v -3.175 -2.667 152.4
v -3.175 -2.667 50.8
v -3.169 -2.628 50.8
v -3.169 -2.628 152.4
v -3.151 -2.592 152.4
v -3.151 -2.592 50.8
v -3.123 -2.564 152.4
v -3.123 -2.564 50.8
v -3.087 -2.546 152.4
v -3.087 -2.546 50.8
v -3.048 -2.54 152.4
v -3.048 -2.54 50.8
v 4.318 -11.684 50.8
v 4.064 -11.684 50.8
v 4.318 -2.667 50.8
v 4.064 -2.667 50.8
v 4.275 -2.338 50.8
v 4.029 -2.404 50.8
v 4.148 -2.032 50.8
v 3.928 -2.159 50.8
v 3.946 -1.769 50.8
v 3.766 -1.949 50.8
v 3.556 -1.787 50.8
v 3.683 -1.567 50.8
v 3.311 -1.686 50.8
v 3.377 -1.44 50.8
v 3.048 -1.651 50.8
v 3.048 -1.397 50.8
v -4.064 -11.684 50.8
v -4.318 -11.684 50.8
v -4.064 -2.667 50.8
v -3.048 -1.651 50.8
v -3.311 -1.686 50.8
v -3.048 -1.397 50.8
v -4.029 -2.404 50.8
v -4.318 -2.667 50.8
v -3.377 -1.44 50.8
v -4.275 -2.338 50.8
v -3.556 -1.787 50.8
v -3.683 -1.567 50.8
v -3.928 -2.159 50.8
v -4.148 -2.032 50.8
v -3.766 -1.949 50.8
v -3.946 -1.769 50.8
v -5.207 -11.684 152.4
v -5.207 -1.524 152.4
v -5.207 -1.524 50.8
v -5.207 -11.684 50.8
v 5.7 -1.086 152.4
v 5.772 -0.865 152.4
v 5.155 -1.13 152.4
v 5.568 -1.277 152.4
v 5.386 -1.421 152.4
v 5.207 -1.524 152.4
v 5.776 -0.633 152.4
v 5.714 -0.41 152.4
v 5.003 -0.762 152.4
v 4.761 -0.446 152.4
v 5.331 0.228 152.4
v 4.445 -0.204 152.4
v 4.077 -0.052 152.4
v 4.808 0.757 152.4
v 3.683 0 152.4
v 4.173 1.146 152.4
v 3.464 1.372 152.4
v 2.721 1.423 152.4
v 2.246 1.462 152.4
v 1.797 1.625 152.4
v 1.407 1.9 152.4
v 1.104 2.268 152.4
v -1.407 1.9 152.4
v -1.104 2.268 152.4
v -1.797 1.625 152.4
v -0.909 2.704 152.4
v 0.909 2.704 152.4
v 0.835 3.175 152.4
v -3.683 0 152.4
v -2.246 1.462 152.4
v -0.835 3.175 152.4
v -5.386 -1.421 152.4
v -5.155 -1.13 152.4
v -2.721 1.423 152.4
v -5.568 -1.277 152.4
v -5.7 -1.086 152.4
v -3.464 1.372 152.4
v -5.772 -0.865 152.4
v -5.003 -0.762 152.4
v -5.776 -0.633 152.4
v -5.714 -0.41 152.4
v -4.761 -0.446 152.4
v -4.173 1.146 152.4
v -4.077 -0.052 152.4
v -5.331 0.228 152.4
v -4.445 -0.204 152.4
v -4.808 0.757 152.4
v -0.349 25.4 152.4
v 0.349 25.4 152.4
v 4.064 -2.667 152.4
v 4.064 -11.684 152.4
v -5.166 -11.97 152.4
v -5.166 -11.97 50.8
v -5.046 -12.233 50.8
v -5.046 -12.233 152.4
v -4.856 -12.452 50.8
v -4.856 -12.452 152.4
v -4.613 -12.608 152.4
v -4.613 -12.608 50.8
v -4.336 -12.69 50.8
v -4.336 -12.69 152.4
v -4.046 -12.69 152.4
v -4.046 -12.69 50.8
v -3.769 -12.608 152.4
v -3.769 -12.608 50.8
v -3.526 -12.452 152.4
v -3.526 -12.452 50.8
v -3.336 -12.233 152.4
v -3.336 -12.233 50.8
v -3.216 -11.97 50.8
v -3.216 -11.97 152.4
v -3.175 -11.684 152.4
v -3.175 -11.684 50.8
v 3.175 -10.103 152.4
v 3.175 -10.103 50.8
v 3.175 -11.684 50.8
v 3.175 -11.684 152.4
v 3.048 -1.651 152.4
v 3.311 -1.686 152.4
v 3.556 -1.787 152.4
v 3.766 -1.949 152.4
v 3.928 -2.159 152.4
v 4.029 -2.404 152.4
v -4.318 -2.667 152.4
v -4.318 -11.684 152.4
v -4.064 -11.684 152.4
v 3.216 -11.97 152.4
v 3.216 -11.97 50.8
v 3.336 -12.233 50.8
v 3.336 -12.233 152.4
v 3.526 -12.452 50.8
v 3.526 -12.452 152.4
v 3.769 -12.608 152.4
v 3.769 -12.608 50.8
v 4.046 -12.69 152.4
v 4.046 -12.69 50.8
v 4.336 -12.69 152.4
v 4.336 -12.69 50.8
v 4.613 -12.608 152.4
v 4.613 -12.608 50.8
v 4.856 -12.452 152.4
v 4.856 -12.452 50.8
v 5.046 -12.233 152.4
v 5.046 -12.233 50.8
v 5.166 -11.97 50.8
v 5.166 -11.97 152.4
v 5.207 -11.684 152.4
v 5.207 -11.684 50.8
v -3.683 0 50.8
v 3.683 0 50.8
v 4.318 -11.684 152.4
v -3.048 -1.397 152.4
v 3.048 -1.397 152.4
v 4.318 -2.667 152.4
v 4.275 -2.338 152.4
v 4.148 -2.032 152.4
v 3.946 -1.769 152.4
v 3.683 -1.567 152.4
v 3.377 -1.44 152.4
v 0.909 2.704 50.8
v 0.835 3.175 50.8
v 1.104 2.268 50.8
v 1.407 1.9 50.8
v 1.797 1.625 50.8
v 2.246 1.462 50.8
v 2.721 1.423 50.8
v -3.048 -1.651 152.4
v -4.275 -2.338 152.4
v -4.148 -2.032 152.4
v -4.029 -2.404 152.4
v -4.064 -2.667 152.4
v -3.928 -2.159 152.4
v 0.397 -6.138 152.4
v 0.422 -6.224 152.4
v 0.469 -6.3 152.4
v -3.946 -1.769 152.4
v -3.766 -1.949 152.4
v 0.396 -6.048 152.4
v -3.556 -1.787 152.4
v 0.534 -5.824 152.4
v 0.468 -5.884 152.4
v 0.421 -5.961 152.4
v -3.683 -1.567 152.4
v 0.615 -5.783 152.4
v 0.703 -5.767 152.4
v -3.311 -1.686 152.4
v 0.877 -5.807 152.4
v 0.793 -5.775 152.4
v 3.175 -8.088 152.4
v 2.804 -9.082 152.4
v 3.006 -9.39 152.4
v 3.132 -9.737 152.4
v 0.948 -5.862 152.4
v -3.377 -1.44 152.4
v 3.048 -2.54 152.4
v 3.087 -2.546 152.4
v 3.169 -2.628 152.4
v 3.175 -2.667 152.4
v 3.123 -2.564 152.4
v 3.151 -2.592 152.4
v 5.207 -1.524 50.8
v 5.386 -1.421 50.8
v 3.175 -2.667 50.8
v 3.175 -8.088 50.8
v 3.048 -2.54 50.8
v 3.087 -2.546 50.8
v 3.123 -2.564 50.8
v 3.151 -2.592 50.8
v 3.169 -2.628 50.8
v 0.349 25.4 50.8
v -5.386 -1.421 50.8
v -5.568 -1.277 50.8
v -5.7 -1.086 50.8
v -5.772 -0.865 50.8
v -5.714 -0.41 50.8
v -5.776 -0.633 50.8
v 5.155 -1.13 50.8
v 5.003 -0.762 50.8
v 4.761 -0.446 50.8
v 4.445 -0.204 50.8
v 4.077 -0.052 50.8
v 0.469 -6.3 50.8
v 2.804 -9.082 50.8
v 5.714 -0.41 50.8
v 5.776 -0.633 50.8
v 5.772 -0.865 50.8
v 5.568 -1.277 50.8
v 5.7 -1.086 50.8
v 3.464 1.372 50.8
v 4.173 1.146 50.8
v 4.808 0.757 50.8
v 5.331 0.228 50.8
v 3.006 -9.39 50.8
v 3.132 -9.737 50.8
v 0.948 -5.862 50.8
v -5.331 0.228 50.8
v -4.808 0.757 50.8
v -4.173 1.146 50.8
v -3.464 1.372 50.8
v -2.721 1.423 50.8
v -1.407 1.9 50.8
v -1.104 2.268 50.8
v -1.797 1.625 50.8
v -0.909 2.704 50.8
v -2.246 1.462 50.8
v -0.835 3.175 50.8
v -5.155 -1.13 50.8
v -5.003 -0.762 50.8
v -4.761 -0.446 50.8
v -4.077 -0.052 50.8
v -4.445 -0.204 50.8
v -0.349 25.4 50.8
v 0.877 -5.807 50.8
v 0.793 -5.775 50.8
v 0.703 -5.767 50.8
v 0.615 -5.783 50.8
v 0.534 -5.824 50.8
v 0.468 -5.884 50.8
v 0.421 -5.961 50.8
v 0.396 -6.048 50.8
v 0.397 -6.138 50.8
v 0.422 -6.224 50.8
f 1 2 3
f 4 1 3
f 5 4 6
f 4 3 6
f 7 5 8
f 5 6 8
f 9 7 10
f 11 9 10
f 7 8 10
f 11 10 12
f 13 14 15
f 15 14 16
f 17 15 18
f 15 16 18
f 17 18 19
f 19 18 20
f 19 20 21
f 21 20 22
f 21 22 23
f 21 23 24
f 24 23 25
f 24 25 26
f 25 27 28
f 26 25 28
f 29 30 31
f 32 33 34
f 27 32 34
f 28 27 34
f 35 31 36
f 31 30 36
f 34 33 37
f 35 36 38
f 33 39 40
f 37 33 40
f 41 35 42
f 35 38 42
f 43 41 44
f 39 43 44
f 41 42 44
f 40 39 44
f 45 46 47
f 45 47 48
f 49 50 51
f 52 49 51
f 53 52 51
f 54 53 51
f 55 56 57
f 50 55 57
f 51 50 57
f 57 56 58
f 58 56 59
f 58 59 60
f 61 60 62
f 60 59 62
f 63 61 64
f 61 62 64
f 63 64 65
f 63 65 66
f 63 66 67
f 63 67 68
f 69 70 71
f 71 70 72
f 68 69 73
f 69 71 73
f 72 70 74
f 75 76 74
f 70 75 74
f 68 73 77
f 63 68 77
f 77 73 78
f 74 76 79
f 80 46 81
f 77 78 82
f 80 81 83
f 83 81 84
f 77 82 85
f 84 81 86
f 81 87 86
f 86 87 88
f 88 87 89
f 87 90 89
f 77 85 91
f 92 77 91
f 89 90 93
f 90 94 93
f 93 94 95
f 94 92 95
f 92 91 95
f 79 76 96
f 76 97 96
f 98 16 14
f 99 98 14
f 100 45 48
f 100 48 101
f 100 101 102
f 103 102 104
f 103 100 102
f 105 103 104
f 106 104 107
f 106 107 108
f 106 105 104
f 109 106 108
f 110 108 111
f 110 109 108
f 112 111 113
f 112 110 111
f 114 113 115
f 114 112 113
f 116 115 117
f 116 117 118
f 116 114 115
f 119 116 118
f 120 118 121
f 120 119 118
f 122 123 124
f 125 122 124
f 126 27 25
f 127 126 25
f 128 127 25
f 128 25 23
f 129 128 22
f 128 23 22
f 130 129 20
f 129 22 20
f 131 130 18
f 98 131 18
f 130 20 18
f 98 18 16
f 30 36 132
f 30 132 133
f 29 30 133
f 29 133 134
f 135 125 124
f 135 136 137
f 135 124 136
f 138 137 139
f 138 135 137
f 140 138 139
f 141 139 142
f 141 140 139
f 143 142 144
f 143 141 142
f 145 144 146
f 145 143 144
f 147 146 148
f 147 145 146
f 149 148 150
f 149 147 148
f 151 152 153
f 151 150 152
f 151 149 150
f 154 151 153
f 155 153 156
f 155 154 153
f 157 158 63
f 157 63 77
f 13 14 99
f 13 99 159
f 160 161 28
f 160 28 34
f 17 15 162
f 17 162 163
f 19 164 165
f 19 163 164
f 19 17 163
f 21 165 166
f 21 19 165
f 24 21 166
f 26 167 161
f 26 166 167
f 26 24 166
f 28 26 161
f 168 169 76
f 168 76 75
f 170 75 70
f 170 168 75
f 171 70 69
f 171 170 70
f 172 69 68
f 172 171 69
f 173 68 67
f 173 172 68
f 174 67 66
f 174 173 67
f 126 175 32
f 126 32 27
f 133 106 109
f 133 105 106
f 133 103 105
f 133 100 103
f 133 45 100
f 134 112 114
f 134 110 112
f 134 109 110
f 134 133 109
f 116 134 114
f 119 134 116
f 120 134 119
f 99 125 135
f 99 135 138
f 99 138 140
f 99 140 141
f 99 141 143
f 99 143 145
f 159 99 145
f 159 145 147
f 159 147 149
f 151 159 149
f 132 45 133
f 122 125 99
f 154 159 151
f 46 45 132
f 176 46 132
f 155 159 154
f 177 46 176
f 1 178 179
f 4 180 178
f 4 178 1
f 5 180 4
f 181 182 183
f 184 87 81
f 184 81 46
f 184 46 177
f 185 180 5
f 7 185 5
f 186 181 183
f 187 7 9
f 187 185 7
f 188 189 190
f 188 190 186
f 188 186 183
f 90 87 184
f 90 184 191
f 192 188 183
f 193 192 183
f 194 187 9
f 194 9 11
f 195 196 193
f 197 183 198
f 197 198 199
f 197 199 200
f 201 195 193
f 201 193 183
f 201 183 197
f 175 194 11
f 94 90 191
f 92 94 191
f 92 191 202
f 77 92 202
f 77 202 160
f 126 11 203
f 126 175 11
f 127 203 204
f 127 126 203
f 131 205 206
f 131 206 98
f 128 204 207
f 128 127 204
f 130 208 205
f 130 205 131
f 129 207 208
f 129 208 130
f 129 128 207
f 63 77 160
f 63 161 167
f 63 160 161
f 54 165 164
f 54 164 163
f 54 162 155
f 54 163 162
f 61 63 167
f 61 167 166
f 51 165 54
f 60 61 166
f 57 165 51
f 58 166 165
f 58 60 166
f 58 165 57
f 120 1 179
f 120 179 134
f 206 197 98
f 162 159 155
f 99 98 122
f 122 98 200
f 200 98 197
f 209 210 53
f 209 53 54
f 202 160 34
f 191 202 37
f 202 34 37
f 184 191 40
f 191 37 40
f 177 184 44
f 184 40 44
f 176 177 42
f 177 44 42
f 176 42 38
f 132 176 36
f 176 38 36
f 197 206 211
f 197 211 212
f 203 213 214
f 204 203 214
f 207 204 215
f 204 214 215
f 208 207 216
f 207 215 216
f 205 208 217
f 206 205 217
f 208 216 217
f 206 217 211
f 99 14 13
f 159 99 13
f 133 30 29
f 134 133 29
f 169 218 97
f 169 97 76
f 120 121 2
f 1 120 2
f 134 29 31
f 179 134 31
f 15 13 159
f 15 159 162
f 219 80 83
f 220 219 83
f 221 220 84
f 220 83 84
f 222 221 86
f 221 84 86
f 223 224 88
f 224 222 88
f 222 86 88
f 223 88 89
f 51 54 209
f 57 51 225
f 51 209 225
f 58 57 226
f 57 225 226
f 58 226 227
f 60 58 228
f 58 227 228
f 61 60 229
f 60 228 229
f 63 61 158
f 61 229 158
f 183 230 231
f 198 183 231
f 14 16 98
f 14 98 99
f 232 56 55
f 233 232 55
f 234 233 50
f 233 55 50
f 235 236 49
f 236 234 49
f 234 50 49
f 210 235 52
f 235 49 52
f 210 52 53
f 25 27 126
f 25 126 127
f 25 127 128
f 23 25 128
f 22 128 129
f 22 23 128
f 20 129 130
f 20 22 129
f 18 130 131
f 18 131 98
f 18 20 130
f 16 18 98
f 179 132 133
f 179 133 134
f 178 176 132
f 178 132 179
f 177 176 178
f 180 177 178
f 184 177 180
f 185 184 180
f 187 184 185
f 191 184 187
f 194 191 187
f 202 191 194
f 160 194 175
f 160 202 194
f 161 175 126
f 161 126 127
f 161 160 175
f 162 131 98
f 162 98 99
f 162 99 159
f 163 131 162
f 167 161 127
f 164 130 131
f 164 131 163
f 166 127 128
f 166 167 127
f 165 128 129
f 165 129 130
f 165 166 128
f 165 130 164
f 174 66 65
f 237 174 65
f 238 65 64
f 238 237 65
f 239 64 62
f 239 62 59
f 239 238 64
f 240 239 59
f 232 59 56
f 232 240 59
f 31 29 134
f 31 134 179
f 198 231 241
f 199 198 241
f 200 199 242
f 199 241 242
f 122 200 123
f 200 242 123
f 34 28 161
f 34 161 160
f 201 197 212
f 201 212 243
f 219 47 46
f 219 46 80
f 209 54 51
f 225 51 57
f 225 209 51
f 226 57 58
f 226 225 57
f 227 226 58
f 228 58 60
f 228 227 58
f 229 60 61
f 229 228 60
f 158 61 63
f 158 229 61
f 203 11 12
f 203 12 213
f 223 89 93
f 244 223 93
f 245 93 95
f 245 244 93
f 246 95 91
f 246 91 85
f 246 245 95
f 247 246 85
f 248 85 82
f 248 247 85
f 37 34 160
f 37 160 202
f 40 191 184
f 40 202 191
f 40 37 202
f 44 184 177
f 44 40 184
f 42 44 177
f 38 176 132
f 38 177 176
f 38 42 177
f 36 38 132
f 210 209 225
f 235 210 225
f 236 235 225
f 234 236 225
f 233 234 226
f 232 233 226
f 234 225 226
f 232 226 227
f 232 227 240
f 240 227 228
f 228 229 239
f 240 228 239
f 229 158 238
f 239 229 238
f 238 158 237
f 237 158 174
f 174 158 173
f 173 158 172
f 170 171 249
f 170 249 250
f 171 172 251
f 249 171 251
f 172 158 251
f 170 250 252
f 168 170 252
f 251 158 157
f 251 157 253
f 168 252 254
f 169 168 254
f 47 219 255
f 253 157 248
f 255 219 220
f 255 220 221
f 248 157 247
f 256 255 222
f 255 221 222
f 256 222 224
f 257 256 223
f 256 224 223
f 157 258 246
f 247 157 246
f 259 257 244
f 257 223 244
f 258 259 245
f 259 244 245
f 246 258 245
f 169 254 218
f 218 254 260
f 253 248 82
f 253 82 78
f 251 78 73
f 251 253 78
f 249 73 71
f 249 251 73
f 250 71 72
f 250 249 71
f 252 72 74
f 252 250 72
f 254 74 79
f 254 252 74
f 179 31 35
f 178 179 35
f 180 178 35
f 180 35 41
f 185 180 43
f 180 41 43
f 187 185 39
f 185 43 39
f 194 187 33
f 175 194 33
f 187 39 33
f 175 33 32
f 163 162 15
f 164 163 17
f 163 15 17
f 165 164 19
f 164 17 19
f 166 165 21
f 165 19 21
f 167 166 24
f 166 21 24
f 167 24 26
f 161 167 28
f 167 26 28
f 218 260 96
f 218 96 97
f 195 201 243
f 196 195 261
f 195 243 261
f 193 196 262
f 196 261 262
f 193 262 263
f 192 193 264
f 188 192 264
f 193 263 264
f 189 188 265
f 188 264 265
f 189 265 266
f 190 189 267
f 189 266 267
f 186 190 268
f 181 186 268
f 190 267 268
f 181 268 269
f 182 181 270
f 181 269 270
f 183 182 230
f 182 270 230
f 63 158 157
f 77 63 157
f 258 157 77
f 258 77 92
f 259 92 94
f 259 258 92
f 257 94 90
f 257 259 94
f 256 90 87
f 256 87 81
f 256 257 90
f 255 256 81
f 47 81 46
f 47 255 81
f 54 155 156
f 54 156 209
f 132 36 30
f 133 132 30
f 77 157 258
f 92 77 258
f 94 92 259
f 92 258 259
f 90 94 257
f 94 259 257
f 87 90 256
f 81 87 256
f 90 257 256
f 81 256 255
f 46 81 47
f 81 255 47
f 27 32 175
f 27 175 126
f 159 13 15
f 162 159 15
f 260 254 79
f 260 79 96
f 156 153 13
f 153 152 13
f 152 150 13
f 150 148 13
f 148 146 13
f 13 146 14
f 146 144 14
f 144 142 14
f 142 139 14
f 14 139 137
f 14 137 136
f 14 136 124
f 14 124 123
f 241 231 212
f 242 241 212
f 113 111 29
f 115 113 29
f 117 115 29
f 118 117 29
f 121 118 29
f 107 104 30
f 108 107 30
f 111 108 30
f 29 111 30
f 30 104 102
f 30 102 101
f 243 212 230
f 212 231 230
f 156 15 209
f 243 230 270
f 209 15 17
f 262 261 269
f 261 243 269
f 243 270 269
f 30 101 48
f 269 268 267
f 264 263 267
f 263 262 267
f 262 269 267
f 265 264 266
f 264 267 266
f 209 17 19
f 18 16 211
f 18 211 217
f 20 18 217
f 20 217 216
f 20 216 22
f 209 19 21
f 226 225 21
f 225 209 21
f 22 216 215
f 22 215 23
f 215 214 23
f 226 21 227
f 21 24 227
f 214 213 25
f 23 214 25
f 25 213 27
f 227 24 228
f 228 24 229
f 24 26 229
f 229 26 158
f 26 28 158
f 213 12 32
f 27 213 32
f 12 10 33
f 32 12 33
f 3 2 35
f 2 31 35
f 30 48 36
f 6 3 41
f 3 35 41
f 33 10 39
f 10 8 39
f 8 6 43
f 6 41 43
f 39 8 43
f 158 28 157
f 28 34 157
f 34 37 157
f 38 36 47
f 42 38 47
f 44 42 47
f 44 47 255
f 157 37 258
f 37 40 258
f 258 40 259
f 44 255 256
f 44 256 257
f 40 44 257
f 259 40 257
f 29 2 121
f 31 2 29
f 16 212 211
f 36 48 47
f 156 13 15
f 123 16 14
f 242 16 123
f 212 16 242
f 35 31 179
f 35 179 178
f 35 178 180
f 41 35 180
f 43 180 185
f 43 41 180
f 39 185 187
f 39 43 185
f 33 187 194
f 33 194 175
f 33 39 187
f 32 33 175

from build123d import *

# Parameters (mm, degrees)
BOSS_EXTRUDE1_DEPTH      = 152.4
BOSS_EXTRUDE1_DEPTH_BACK = 152.4
BOSS_EXTRUDE2_DEPTH      = 152.4
BOSS_EXTRUDE2_DEPTH_BACK = 152.4
FILLET1_R                = 0.79375
CUT_EXTRUDE1_DEPTH       = 155.610348225
CUT_EXTRUDE1_DEPTH_BACK  = 155.610348225
BOSS_EXTRUDE3_DEPTH      = 152.4
BOSS_EXTRUDE3_DEPTH_BACK = 152.4
FILLET2_RADIUS           = 1.016
FILLET2_LENGTH           = 304.8
FILLET3_RADIUS           = 1.016
FILLET3_LENGTH           = 304.8
CUT_EXTRUDE2_DEPTH       = 155.610348225
CUT_EXTRUDE2_DEPTH_BACK  = 155.610348225
SKETCH6_W                = 203.2
SKETCH6_H                = 38.1


with BuildPart() as part:
    # Sketch4 → Boss-Extrude1 (new, two sides: drawn at the far end of the back side and taken through both)
    with BuildSketch(Plane.XY.offset(-BOSS_EXTRUDE1_DEPTH_BACK)):
        with BuildLine():
            Line((-5.207, -12.7), (-3.175, -12.7))
            Line((-3.175, -12.7), (-3.175, -2.667))
            ThreePointArc((-3.175, -2.667), (-3.137802561, -2.577197439), (-3.048, -2.54))
            Line((-3.048, -2.54), (3.048, -2.54))
            ThreePointArc((3.048, -2.54), (3.137802561, -2.577197439), (3.175, -2.667))
            Line((3.175, -2.667), (3.175, -8.088159021))
            Line((3.175, -8.088159021), (0.948361947, -5.861520968))
            ThreePointArc((0.948361947, -5.861520968), (0.498727791, -5.851709916), (0.46931331, -6.300488167))
            Line((0.46931331, -6.300488167), (2.803595553, -9.082377417))
            ThreePointArc((2.803595553, -9.082377417), (3.079262035, -9.559845769), (3.175, -10.102802747))
            Line((3.175, -10.102802747), (3.175, -12.7))
            Line((3.175, -12.7), (5.207, -12.7))
            Line((5.207, -12.7), (5.207, -1.524))
            ThreePointArc((5.207, -1.524), (4.760630735, -0.446369265), (3.683, 0))
            Line((3.683, 0), (-3.683, 0))
            ThreePointArc((-3.683, 0), (-4.760630735, -0.446369265), (-5.207, -1.524))
            Line((-5.207, -1.524), (-5.207, -12.7))
        make_face()
    extrude(amount=BOSS_EXTRUDE1_DEPTH + BOSS_EXTRUDE1_DEPTH_BACK)

    # Sketch5 → Cut-Extrude1 (cut, two sides: drawn at the far end of the back side and taken through both)
    with BuildSketch(Plane.XY.offset(-CUT_EXTRUDE1_DEPTH_BACK)):
        with BuildLine():
            Line((4.318, -11.684), (4.318, -2.667))
            ThreePointArc((4.318, -2.667), (3.946025612, -1.768974388), (3.048, -1.397))
            Line((3.048, -1.397), (-3.048, -1.397))
            ThreePointArc((-3.048, -1.397), (-3.946025612, -1.768974388), (-4.318, -2.667))
            Line((-4.318, -2.667), (-4.318, -11.684))
            Line((-4.318, -11.684), (-4.064, -11.684))
            Line((-4.064, -11.684), (-4.064, -2.667))
            ThreePointArc((-4.064, -2.667), (-3.76642049, -1.94857951), (-3.048, -1.651))
            Line((-3.048, -1.651), (3.048, -1.651))
            ThreePointArc((3.048, -1.651), (3.76642049, -1.94857951), (4.064, -2.667))
            Line((4.064, -2.667), (4.064, -11.684))
            Line((4.064, -11.684), (4.318, -11.684))
        make_face()
    extrude(amount=CUT_EXTRUDE1_DEPTH + CUT_EXTRUDE1_DEPTH_BACK, mode=Mode.SUBTRACT)

    # Fillet2: full round fillet: the end face becomes a half cylinder, R = half its width
    fillet2_face = Plane((4.191, -12.7, 0), x_dir=(0, 0, 1), z_dir=(0, -1, 0))  # on the end face: x along it, z out of the body
    fillet2_slab = fillet2_face.offset(-FILLET2_RADIUS / 2) * Box(FILLET2_LENGTH, 2 * FILLET2_RADIUS, FILLET2_RADIUS, mode=Mode.PRIVATE)  # the body's end, R deep
    fillet2_round = Plane((4.191, -11.684, 0), x_dir=(0, -1, 0), z_dir=(0, 0, 1)) * Cylinder(FILLET2_RADIUS, FILLET2_LENGTH, mode=Mode.PRIVATE)  # its axis R under the face
    add(fillet2_slab - fillet2_round, mode=Mode.SUBTRACT)

    # Fillet3: full round fillet: the end face becomes a half cylinder, R = half its width
    fillet3_face = Plane((-4.191, -12.7, 0), x_dir=(0, 0, 1), z_dir=(0, -1, 0))  # on the end face: x along it, z out of the body
    fillet3_slab = fillet3_face.offset(-FILLET3_RADIUS / 2) * Box(FILLET3_LENGTH, 2 * FILLET3_RADIUS, FILLET3_RADIUS, mode=Mode.PRIVATE)  # the body's end, R deep
    fillet3_round = Plane((-4.191, -11.684, 0), x_dir=(0, -1, 0), z_dir=(0, 0, 1)) * Cylinder(FILLET3_RADIUS, FILLET3_LENGTH, mode=Mode.PRIVATE)  # its axis R under the face
    add(fillet3_slab - fillet3_round, mode=Mode.SUBTRACT)


with BuildPart() as body_2:
    # Sketch3 → Boss-Extrude2 (new, two sides: drawn at the far end of the back side and taken through both)
    with BuildSketch(Plane.XY.offset(-BOSS_EXTRUDE2_DEPTH_BACK)):
        with BuildLine():
            Line((3.683, 0), (-3.683, 0))
            ThreePointArc((-3.683, 0), (-4.760630735, -0.446369265), (-5.207, -1.524))
            Line((-5.207, -1.524), (-5.930511184, -1.106280623))
            ThreePointArc((-5.930511184, -1.106280623), (-4.801606302, 0.762), (-2.721270401, 1.423136341))
            ThreePointArc((-2.721270401, 1.423136341), (-1.407478061, 1.900010596), (-0.834886247, 3.175))
            Line((-0.834886247, 3.175), (-0.34925, 25.4))
            Line((-0.34925, 25.4), (0.34925, 25.4))
            Line((0.34925, 25.4), (0.834886247, 3.175))
            ThreePointArc((0.834886247, 3.175), (1.407478061, 1.900010596), (2.721270401, 1.423136341))
            ThreePointArc((2.721270401, 1.423136341), (4.801606302, 0.762), (5.930511184, -1.106280623))
            Line((5.930511184, -1.106280623), (5.207, -1.524))
            ThreePointArc((5.207, -1.524), (4.760630735, -0.446369265), (3.683, 0))
        make_face()
    extrude(amount=BOSS_EXTRUDE2_DEPTH + BOSS_EXTRUDE2_DEPTH_BACK)

    # Fillet1
    fillet1_edges = [body_2.edges().sort_by_distance(p)[0] for p in [
        (5.930511184, -1.106280623, 0),
        (-5.930511184, -1.106280623, 0),
    ]]
    fillet(fillet1_edges, radius=FILLET1_R)


with BuildPart() as body_3:
    # Sketch5<2> → Boss-Extrude3 (new, two sides: drawn at the far end of the back side and taken through both)
    with BuildSketch(Plane.XY.offset(-BOSS_EXTRUDE3_DEPTH_BACK)):
        with BuildLine():
            Line((4.318, -11.684), (4.318, -2.667))
            ThreePointArc((4.318, -2.667), (3.946025612, -1.768974388), (3.048, -1.397))
            Line((3.048, -1.397), (-3.048, -1.397))
            ThreePointArc((-3.048, -1.397), (-3.946025612, -1.768974388), (-4.318, -2.667))
            Line((-4.318, -2.667), (-4.318, -11.684))
            Line((-4.318, -11.684), (-4.064, -11.684))
            Line((-4.064, -11.684), (-4.064, -2.667))
            ThreePointArc((-4.064, -2.667), (-3.76642049, -1.94857951), (-3.048, -1.651))
            Line((-3.048, -1.651), (3.048, -1.651))
            ThreePointArc((3.048, -1.651), (3.76642049, -1.94857951), (4.064, -2.667))
            Line((4.064, -2.667), (4.064, -11.684))
            Line((4.064, -11.684), (4.318, -11.684))
        make_face()
    extrude(amount=BOSS_EXTRUDE3_DEPTH + BOSS_EXTRUDE3_DEPTH_BACK)


with BuildPart() as cut_extrude2_tool:
    # Sketch6 → Cut-Extrude2 (new, two sides: drawn at the far end of the back side and taken through both)
    with BuildSketch(Plane(origin=(0, 0, 0), x_dir=(0, 0, -1), z_dir=(1, 0, 0)).offset(-CUT_EXTRUDE2_DEPTH_BACK)):
        with Locations((50.8, 6.35)):
            Rectangle(SKETCH6_W, SKETCH6_H)
    extrude(amount=CUT_EXTRUDE2_DEPTH + CUT_EXTRUDE2_DEPTH_BACK)


with BuildPart() as part_1:
    add(part.part)

    # Cut-Extrude2: cut by cut_extrude2_tool
    add(cut_extrude2_tool.part, mode=Mode.SUBTRACT)


with BuildPart() as body_2_1:
    add(body_2.part)

    # Cut-Extrude2: cut by cut_extrude2_tool
    add(cut_extrude2_tool.part, mode=Mode.SUBTRACT)


with BuildPart() as body_3_1:
    add(body_3.part)

    # Cut-Extrude2: cut by cut_extrude2_tool
    add(cut_extrude2_tool.part, mode=Mode.SUBTRACT)


solid = Compound([part_1.part, body_2_1.part, body_3_1.part])
